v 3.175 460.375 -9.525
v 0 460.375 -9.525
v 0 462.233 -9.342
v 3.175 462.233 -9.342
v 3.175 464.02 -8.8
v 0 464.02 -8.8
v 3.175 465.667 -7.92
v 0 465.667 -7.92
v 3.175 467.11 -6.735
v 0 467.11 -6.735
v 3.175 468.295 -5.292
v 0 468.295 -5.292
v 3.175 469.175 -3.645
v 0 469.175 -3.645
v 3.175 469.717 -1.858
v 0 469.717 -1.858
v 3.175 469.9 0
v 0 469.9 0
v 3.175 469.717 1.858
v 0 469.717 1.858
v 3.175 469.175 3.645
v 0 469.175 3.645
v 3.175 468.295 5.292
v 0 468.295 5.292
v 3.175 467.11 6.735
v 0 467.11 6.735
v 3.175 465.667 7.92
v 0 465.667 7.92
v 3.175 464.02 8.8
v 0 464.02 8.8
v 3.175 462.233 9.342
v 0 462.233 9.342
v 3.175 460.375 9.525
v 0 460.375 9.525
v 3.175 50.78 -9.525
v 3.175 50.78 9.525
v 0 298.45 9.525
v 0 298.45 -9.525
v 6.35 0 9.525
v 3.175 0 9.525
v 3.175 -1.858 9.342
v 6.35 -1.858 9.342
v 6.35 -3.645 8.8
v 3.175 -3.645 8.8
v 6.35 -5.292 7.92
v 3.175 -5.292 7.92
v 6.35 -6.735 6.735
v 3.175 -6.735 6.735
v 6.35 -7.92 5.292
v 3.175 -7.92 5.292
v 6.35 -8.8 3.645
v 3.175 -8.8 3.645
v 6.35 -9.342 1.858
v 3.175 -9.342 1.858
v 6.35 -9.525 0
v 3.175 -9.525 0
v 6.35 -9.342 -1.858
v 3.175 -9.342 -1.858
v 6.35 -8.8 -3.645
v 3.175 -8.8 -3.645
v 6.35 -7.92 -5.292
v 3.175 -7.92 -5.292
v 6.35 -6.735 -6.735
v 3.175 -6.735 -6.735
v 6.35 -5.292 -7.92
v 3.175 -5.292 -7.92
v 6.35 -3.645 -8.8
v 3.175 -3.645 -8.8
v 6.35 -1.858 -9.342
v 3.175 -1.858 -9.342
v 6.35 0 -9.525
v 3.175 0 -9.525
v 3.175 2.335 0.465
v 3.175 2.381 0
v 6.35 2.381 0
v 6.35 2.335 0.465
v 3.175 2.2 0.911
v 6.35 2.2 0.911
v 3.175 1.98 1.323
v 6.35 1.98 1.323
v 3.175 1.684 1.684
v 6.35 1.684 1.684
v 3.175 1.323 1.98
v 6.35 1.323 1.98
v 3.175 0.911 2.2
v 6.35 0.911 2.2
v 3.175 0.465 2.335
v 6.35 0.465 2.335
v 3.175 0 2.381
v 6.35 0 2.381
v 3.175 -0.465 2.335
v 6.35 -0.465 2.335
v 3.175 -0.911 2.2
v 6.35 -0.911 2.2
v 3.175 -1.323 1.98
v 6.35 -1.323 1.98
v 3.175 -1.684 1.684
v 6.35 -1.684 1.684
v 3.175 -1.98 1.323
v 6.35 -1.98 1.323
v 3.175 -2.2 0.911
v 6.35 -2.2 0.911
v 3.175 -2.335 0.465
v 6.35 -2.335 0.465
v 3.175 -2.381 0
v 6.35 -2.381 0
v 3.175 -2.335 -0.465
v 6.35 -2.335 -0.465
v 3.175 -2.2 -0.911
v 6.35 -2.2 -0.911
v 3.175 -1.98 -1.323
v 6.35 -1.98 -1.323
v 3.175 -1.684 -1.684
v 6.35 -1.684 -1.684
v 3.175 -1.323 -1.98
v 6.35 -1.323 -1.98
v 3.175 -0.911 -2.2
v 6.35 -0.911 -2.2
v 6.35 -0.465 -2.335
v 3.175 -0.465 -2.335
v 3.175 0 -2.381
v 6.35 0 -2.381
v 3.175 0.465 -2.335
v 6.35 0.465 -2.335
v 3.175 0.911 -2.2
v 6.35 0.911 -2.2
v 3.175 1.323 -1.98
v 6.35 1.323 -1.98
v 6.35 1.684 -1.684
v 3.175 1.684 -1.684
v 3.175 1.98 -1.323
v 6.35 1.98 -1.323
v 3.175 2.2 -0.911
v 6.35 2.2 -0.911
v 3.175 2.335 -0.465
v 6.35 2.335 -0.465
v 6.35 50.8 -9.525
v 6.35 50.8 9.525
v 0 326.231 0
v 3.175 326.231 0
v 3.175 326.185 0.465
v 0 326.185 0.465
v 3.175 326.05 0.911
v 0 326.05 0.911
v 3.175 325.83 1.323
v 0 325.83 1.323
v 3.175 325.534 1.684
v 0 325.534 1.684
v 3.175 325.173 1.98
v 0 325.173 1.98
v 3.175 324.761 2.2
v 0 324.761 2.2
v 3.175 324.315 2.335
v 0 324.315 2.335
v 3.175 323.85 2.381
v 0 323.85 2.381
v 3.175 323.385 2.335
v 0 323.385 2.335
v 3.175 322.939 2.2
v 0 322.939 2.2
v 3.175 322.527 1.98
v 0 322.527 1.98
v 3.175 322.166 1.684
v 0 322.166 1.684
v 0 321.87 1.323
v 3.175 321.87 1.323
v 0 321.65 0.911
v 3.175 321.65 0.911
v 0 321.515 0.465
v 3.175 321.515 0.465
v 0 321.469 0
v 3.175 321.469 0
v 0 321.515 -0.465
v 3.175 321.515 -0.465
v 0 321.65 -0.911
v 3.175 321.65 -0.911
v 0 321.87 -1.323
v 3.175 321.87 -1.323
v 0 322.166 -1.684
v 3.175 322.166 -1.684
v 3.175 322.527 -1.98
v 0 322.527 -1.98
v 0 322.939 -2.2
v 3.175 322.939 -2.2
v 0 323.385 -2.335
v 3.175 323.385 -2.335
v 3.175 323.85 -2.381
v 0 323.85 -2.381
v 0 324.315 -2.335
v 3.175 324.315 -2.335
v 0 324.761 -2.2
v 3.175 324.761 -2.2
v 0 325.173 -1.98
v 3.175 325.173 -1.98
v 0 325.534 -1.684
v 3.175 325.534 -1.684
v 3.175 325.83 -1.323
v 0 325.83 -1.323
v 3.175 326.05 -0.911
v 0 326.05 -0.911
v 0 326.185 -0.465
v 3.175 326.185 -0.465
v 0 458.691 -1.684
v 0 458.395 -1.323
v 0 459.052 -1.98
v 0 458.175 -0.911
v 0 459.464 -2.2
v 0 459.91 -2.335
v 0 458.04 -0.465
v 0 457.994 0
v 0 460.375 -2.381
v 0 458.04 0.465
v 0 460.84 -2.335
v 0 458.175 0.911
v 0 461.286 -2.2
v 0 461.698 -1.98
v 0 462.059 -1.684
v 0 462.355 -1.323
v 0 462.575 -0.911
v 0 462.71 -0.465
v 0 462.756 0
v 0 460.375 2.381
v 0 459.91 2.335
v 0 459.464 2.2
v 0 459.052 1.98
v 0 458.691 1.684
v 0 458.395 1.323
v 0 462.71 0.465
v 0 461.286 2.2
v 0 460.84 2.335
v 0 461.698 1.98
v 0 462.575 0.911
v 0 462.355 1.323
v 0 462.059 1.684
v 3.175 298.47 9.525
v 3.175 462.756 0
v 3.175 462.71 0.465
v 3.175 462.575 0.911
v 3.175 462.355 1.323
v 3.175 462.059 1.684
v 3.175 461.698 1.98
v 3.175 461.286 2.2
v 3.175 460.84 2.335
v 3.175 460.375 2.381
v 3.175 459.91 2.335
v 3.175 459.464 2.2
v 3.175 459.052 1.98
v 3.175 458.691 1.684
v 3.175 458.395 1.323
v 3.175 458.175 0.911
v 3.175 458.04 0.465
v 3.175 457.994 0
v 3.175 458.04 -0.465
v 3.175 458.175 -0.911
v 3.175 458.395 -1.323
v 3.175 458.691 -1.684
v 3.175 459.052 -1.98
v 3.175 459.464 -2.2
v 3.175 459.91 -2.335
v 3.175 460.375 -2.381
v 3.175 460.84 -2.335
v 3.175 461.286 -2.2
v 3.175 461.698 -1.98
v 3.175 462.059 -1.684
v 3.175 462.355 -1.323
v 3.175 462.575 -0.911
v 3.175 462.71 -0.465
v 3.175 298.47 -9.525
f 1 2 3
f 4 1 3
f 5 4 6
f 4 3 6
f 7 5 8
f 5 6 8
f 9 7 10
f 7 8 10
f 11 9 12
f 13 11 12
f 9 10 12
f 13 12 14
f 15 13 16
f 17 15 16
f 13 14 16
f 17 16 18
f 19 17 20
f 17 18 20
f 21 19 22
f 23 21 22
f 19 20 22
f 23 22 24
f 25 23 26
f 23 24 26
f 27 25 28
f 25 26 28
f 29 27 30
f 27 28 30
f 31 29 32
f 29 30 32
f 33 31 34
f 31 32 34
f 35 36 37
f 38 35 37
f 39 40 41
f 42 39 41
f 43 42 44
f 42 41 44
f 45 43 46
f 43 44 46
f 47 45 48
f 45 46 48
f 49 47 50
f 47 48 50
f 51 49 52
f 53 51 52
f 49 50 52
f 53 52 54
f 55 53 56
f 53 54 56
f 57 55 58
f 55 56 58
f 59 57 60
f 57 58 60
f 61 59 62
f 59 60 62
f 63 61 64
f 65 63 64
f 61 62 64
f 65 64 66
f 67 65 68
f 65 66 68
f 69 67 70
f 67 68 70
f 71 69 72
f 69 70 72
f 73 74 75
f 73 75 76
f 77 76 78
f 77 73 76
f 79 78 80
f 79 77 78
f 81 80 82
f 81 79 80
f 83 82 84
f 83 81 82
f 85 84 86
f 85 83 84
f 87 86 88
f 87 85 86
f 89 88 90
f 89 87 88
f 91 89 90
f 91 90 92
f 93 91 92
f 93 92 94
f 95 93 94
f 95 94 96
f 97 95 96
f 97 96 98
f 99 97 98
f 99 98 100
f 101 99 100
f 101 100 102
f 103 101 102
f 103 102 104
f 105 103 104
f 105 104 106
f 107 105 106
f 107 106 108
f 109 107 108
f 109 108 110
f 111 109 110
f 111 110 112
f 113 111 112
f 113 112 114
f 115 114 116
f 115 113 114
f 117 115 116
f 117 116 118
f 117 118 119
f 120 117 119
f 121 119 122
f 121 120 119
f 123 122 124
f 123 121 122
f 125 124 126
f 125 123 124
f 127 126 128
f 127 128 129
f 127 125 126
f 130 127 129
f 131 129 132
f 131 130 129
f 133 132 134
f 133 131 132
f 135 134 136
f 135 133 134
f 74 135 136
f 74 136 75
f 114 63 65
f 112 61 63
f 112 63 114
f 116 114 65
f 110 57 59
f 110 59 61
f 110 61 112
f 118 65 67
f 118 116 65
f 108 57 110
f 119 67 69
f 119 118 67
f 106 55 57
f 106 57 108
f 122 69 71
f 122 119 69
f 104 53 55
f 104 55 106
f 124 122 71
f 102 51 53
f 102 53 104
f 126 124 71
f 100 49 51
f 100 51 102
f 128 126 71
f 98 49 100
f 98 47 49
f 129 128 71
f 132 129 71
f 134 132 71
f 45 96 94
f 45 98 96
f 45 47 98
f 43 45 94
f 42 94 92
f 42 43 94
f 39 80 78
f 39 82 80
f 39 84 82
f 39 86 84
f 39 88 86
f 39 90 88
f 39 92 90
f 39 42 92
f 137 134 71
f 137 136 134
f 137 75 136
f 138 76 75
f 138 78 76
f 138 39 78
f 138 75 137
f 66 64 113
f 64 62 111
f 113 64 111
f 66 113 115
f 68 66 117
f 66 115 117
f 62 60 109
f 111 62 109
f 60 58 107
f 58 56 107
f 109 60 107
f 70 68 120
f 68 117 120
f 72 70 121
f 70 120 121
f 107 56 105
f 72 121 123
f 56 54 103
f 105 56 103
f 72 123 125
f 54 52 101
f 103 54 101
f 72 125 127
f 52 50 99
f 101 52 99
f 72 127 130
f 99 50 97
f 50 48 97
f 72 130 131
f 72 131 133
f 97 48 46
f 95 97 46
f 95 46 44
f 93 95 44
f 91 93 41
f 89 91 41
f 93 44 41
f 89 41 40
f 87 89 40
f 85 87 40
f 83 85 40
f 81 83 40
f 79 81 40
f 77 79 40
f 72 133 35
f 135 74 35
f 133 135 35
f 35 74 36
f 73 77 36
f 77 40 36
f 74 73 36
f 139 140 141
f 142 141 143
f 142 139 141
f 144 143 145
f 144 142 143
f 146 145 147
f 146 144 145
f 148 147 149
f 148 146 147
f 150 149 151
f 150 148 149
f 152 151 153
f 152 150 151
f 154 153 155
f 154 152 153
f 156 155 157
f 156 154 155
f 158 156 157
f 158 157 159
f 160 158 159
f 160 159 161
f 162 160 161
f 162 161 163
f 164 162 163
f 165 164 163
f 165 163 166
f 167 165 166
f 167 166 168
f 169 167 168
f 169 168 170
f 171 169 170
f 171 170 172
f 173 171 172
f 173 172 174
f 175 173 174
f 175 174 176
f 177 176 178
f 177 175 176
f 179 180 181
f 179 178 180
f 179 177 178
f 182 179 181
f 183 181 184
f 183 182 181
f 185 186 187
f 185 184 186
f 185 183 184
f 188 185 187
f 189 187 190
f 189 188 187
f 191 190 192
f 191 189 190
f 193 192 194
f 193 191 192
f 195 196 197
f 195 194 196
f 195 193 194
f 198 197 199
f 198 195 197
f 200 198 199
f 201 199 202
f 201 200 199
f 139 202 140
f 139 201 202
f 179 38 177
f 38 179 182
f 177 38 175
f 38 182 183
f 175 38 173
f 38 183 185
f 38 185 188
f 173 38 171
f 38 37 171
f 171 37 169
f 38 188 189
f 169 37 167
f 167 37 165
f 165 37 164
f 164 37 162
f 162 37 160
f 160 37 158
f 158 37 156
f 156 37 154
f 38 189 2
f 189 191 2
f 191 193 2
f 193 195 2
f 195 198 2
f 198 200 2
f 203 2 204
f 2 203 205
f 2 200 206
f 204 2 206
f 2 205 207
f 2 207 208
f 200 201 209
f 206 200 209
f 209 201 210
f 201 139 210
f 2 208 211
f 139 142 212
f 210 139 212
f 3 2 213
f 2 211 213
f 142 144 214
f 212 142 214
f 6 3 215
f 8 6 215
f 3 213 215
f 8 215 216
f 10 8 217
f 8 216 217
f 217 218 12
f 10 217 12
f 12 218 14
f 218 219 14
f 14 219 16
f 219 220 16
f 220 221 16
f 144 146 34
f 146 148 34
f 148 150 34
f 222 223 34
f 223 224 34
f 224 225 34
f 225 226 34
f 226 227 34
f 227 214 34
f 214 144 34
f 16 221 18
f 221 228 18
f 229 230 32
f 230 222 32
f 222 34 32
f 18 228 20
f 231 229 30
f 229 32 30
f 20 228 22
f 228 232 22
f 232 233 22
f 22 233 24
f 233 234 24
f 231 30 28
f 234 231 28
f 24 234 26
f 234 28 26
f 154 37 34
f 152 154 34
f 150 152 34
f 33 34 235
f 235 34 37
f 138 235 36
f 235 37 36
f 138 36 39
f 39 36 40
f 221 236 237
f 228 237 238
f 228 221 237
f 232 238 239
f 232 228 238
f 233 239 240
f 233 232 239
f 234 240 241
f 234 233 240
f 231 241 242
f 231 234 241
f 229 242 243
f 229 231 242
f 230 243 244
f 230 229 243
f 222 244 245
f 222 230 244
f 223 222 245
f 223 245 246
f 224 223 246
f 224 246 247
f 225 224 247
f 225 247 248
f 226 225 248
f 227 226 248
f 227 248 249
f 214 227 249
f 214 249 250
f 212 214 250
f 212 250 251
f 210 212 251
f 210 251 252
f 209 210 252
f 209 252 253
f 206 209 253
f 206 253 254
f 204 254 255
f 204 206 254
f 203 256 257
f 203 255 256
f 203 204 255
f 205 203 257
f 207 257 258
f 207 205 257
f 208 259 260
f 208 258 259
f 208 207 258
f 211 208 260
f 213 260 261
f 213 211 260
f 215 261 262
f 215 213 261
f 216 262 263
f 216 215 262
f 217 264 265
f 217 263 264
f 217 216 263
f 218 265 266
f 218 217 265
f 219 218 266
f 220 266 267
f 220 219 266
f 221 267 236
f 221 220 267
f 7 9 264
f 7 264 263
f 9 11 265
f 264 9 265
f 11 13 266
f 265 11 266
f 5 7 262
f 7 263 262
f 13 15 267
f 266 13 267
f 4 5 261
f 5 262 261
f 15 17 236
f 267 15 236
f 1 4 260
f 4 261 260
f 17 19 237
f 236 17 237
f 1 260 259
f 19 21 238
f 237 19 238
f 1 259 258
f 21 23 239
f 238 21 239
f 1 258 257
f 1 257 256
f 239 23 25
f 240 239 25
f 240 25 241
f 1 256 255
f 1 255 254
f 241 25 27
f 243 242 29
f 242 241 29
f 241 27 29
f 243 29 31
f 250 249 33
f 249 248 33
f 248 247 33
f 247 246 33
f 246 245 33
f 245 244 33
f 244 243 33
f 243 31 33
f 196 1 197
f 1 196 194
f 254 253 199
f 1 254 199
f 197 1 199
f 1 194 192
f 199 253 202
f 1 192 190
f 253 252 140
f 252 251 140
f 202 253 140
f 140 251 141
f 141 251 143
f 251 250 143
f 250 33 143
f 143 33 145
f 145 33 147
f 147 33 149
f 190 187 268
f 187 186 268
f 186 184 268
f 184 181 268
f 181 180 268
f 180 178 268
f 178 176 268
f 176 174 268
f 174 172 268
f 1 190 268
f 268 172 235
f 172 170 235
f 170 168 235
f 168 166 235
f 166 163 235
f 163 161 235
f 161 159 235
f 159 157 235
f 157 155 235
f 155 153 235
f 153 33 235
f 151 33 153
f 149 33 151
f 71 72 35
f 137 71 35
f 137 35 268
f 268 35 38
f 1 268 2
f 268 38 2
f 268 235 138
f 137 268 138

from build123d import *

# Parameters (mm, degrees)
F0_R     = 2.38125
F1_DEPTH = 6.35
F3_DEPTH = 25.4


with BuildPart() as f1:
    # F0 (on Right) → F1 (new body)
    with BuildSketch(Plane.YZ):
        with BuildLine():
            Line((460.375, 9.525), (0, 9.525))
            ThreePointArc((0, 9.525), (-9.525, 0), (0, -9.525))
            Line((0, -9.525), (460.375, -9.525))
            ThreePointArc((460.375, -9.525), (469.9, 0), (460.375, 9.525))
        make_face()
        Circle(F0_R, mode=Mode.SUBTRACT)
        with Locations((323.85, 0)):
            Circle(F0_R, mode=Mode.SUBTRACT)
        with Locations((460.375, 0)):
            Circle(F0_R, mode=Mode.SUBTRACT)
    extrude(amount=F1_DEPTH)

    # F2 (on face) → F3 (cut)
    with BuildSketch(Plane.XY.offset(9.525)):
        Polygon((3.175, 298.47035), (6.35, 50.8), (6.35, 469.9), (3.175, 469.9), align=None)
        Polygon((3.175, 50.77965), (0, 298.45), (0, -9.525), (3.175, -9.525), align=None)
    extrude(amount=-F3_DEPTH, mode=Mode.SUBTRACT)


solid = f1.part
